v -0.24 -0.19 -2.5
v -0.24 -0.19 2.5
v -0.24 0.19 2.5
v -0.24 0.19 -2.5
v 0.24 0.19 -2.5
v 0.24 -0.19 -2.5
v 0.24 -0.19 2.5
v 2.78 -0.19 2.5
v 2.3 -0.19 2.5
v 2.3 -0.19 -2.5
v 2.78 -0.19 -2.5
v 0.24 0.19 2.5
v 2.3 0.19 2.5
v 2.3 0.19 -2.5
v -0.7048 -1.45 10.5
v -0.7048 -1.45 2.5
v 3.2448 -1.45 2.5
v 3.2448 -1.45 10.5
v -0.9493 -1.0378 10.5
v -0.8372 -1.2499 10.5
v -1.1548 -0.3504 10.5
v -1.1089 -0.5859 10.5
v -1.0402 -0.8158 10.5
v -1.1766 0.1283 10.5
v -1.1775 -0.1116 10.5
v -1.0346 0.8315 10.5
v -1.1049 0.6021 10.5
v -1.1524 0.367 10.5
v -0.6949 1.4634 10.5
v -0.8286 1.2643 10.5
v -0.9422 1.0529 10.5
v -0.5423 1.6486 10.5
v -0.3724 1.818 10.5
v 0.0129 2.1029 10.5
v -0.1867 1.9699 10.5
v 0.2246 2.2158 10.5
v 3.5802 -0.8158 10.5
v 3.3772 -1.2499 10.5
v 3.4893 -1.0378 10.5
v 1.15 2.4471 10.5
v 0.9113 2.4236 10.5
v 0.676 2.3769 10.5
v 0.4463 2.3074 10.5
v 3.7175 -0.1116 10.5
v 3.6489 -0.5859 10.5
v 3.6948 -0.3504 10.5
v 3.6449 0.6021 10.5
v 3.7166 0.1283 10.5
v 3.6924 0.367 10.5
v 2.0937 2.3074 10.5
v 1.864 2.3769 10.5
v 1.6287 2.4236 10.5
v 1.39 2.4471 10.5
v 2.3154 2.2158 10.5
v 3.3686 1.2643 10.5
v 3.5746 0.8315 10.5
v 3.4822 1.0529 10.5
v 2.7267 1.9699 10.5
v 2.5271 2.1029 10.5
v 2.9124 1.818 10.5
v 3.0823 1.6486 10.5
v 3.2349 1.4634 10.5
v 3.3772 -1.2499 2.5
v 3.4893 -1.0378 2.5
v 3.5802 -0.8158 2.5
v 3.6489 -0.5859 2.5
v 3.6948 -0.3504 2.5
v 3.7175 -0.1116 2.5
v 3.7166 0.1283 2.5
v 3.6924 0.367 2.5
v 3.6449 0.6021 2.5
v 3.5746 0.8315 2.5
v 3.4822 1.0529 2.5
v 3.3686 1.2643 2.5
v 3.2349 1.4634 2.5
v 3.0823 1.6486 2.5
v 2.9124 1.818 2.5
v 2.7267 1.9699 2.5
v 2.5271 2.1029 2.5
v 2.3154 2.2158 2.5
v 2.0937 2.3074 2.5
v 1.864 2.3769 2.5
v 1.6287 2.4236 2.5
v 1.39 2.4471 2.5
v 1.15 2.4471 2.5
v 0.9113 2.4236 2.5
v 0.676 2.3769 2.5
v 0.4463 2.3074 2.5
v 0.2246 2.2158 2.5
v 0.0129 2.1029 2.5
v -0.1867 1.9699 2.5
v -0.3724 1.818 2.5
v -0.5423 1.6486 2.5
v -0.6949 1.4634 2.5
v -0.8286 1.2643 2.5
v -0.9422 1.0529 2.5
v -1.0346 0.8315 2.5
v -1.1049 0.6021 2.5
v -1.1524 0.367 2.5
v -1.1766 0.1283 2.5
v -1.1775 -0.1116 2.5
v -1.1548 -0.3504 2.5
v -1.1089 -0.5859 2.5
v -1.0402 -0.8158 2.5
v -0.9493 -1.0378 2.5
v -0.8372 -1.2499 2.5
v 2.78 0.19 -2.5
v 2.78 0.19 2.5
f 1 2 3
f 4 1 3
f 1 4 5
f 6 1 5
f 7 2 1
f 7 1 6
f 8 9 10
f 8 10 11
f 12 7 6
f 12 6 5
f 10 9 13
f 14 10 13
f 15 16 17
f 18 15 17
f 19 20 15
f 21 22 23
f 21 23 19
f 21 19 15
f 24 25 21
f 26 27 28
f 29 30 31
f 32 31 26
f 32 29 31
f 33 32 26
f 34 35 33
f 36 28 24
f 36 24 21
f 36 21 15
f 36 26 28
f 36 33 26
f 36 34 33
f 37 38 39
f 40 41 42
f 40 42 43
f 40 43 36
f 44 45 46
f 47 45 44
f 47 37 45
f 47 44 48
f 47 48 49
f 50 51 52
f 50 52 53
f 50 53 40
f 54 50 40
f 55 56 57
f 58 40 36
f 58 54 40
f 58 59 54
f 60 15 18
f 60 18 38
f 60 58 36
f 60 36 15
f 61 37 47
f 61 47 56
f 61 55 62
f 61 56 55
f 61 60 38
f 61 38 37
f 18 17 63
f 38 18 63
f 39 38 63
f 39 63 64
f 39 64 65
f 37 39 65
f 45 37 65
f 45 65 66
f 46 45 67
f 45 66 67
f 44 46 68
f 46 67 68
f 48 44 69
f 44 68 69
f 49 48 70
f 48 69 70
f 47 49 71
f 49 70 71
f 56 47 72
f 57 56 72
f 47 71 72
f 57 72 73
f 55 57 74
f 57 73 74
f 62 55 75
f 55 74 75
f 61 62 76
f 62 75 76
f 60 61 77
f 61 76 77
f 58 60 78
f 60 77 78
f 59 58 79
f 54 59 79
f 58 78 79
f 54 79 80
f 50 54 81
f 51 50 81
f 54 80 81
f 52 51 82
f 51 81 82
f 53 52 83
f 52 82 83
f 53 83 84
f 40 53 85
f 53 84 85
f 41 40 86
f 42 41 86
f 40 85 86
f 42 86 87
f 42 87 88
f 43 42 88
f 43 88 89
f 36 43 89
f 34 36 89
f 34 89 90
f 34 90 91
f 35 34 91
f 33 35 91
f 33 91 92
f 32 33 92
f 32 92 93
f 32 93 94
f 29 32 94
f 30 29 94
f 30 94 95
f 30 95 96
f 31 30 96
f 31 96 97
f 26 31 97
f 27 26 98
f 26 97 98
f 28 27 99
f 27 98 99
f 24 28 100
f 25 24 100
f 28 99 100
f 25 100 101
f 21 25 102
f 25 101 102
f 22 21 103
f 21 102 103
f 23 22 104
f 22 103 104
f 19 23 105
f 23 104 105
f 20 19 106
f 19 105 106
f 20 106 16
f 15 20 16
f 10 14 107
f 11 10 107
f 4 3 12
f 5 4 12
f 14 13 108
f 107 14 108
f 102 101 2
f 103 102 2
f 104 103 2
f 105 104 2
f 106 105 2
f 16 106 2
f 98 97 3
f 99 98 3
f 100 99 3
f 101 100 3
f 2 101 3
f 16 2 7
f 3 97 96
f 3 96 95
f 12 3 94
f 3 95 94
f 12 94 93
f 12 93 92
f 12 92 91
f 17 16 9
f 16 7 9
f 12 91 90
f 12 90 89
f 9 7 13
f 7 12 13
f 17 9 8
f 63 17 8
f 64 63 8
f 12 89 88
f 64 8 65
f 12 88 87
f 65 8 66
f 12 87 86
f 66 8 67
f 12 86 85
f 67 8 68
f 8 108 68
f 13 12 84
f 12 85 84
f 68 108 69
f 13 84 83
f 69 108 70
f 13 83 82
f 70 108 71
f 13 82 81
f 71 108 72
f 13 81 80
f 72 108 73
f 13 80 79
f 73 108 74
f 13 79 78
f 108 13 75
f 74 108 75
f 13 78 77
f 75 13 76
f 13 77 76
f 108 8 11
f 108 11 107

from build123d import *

# Parameters (mm, degrees)
SKETCH001_W  = 0.48
SKETCH001_H  = 0.38
PAD001_DEPTH = 5
PAD_DEPTH    = 8


with BuildPart() as pad001:
    # Sketch001 → Pad001 (new body)
    with BuildSketch(Plane.XY.offset(2.5)):
        Rectangle(SKETCH001_W, SKETCH001_H)
        with Locations((2.54, 0)):
            Rectangle(SKETCH001_W, SKETCH001_H)
    extrude(amount=-PAD001_DEPTH)


with BuildPart() as to_92l_2_narrow:
    # Sketch → Pad (new body)
    with BuildSketch(Plane.XY.offset(2.5)):
        with BuildLine():
            Line((-0.704842, -1.45), (3.244842, -1.45))
            ThreePointArc((3.244842, -1.45), (1.27, 2.45), (-0.704842, -1.45))
        make_face()
    extrude(amount=PAD_DEPTH)

    # Pad_mp_cp: union Pad001
    add(pad001.part)


solid = to_92l_2_narrow.part
